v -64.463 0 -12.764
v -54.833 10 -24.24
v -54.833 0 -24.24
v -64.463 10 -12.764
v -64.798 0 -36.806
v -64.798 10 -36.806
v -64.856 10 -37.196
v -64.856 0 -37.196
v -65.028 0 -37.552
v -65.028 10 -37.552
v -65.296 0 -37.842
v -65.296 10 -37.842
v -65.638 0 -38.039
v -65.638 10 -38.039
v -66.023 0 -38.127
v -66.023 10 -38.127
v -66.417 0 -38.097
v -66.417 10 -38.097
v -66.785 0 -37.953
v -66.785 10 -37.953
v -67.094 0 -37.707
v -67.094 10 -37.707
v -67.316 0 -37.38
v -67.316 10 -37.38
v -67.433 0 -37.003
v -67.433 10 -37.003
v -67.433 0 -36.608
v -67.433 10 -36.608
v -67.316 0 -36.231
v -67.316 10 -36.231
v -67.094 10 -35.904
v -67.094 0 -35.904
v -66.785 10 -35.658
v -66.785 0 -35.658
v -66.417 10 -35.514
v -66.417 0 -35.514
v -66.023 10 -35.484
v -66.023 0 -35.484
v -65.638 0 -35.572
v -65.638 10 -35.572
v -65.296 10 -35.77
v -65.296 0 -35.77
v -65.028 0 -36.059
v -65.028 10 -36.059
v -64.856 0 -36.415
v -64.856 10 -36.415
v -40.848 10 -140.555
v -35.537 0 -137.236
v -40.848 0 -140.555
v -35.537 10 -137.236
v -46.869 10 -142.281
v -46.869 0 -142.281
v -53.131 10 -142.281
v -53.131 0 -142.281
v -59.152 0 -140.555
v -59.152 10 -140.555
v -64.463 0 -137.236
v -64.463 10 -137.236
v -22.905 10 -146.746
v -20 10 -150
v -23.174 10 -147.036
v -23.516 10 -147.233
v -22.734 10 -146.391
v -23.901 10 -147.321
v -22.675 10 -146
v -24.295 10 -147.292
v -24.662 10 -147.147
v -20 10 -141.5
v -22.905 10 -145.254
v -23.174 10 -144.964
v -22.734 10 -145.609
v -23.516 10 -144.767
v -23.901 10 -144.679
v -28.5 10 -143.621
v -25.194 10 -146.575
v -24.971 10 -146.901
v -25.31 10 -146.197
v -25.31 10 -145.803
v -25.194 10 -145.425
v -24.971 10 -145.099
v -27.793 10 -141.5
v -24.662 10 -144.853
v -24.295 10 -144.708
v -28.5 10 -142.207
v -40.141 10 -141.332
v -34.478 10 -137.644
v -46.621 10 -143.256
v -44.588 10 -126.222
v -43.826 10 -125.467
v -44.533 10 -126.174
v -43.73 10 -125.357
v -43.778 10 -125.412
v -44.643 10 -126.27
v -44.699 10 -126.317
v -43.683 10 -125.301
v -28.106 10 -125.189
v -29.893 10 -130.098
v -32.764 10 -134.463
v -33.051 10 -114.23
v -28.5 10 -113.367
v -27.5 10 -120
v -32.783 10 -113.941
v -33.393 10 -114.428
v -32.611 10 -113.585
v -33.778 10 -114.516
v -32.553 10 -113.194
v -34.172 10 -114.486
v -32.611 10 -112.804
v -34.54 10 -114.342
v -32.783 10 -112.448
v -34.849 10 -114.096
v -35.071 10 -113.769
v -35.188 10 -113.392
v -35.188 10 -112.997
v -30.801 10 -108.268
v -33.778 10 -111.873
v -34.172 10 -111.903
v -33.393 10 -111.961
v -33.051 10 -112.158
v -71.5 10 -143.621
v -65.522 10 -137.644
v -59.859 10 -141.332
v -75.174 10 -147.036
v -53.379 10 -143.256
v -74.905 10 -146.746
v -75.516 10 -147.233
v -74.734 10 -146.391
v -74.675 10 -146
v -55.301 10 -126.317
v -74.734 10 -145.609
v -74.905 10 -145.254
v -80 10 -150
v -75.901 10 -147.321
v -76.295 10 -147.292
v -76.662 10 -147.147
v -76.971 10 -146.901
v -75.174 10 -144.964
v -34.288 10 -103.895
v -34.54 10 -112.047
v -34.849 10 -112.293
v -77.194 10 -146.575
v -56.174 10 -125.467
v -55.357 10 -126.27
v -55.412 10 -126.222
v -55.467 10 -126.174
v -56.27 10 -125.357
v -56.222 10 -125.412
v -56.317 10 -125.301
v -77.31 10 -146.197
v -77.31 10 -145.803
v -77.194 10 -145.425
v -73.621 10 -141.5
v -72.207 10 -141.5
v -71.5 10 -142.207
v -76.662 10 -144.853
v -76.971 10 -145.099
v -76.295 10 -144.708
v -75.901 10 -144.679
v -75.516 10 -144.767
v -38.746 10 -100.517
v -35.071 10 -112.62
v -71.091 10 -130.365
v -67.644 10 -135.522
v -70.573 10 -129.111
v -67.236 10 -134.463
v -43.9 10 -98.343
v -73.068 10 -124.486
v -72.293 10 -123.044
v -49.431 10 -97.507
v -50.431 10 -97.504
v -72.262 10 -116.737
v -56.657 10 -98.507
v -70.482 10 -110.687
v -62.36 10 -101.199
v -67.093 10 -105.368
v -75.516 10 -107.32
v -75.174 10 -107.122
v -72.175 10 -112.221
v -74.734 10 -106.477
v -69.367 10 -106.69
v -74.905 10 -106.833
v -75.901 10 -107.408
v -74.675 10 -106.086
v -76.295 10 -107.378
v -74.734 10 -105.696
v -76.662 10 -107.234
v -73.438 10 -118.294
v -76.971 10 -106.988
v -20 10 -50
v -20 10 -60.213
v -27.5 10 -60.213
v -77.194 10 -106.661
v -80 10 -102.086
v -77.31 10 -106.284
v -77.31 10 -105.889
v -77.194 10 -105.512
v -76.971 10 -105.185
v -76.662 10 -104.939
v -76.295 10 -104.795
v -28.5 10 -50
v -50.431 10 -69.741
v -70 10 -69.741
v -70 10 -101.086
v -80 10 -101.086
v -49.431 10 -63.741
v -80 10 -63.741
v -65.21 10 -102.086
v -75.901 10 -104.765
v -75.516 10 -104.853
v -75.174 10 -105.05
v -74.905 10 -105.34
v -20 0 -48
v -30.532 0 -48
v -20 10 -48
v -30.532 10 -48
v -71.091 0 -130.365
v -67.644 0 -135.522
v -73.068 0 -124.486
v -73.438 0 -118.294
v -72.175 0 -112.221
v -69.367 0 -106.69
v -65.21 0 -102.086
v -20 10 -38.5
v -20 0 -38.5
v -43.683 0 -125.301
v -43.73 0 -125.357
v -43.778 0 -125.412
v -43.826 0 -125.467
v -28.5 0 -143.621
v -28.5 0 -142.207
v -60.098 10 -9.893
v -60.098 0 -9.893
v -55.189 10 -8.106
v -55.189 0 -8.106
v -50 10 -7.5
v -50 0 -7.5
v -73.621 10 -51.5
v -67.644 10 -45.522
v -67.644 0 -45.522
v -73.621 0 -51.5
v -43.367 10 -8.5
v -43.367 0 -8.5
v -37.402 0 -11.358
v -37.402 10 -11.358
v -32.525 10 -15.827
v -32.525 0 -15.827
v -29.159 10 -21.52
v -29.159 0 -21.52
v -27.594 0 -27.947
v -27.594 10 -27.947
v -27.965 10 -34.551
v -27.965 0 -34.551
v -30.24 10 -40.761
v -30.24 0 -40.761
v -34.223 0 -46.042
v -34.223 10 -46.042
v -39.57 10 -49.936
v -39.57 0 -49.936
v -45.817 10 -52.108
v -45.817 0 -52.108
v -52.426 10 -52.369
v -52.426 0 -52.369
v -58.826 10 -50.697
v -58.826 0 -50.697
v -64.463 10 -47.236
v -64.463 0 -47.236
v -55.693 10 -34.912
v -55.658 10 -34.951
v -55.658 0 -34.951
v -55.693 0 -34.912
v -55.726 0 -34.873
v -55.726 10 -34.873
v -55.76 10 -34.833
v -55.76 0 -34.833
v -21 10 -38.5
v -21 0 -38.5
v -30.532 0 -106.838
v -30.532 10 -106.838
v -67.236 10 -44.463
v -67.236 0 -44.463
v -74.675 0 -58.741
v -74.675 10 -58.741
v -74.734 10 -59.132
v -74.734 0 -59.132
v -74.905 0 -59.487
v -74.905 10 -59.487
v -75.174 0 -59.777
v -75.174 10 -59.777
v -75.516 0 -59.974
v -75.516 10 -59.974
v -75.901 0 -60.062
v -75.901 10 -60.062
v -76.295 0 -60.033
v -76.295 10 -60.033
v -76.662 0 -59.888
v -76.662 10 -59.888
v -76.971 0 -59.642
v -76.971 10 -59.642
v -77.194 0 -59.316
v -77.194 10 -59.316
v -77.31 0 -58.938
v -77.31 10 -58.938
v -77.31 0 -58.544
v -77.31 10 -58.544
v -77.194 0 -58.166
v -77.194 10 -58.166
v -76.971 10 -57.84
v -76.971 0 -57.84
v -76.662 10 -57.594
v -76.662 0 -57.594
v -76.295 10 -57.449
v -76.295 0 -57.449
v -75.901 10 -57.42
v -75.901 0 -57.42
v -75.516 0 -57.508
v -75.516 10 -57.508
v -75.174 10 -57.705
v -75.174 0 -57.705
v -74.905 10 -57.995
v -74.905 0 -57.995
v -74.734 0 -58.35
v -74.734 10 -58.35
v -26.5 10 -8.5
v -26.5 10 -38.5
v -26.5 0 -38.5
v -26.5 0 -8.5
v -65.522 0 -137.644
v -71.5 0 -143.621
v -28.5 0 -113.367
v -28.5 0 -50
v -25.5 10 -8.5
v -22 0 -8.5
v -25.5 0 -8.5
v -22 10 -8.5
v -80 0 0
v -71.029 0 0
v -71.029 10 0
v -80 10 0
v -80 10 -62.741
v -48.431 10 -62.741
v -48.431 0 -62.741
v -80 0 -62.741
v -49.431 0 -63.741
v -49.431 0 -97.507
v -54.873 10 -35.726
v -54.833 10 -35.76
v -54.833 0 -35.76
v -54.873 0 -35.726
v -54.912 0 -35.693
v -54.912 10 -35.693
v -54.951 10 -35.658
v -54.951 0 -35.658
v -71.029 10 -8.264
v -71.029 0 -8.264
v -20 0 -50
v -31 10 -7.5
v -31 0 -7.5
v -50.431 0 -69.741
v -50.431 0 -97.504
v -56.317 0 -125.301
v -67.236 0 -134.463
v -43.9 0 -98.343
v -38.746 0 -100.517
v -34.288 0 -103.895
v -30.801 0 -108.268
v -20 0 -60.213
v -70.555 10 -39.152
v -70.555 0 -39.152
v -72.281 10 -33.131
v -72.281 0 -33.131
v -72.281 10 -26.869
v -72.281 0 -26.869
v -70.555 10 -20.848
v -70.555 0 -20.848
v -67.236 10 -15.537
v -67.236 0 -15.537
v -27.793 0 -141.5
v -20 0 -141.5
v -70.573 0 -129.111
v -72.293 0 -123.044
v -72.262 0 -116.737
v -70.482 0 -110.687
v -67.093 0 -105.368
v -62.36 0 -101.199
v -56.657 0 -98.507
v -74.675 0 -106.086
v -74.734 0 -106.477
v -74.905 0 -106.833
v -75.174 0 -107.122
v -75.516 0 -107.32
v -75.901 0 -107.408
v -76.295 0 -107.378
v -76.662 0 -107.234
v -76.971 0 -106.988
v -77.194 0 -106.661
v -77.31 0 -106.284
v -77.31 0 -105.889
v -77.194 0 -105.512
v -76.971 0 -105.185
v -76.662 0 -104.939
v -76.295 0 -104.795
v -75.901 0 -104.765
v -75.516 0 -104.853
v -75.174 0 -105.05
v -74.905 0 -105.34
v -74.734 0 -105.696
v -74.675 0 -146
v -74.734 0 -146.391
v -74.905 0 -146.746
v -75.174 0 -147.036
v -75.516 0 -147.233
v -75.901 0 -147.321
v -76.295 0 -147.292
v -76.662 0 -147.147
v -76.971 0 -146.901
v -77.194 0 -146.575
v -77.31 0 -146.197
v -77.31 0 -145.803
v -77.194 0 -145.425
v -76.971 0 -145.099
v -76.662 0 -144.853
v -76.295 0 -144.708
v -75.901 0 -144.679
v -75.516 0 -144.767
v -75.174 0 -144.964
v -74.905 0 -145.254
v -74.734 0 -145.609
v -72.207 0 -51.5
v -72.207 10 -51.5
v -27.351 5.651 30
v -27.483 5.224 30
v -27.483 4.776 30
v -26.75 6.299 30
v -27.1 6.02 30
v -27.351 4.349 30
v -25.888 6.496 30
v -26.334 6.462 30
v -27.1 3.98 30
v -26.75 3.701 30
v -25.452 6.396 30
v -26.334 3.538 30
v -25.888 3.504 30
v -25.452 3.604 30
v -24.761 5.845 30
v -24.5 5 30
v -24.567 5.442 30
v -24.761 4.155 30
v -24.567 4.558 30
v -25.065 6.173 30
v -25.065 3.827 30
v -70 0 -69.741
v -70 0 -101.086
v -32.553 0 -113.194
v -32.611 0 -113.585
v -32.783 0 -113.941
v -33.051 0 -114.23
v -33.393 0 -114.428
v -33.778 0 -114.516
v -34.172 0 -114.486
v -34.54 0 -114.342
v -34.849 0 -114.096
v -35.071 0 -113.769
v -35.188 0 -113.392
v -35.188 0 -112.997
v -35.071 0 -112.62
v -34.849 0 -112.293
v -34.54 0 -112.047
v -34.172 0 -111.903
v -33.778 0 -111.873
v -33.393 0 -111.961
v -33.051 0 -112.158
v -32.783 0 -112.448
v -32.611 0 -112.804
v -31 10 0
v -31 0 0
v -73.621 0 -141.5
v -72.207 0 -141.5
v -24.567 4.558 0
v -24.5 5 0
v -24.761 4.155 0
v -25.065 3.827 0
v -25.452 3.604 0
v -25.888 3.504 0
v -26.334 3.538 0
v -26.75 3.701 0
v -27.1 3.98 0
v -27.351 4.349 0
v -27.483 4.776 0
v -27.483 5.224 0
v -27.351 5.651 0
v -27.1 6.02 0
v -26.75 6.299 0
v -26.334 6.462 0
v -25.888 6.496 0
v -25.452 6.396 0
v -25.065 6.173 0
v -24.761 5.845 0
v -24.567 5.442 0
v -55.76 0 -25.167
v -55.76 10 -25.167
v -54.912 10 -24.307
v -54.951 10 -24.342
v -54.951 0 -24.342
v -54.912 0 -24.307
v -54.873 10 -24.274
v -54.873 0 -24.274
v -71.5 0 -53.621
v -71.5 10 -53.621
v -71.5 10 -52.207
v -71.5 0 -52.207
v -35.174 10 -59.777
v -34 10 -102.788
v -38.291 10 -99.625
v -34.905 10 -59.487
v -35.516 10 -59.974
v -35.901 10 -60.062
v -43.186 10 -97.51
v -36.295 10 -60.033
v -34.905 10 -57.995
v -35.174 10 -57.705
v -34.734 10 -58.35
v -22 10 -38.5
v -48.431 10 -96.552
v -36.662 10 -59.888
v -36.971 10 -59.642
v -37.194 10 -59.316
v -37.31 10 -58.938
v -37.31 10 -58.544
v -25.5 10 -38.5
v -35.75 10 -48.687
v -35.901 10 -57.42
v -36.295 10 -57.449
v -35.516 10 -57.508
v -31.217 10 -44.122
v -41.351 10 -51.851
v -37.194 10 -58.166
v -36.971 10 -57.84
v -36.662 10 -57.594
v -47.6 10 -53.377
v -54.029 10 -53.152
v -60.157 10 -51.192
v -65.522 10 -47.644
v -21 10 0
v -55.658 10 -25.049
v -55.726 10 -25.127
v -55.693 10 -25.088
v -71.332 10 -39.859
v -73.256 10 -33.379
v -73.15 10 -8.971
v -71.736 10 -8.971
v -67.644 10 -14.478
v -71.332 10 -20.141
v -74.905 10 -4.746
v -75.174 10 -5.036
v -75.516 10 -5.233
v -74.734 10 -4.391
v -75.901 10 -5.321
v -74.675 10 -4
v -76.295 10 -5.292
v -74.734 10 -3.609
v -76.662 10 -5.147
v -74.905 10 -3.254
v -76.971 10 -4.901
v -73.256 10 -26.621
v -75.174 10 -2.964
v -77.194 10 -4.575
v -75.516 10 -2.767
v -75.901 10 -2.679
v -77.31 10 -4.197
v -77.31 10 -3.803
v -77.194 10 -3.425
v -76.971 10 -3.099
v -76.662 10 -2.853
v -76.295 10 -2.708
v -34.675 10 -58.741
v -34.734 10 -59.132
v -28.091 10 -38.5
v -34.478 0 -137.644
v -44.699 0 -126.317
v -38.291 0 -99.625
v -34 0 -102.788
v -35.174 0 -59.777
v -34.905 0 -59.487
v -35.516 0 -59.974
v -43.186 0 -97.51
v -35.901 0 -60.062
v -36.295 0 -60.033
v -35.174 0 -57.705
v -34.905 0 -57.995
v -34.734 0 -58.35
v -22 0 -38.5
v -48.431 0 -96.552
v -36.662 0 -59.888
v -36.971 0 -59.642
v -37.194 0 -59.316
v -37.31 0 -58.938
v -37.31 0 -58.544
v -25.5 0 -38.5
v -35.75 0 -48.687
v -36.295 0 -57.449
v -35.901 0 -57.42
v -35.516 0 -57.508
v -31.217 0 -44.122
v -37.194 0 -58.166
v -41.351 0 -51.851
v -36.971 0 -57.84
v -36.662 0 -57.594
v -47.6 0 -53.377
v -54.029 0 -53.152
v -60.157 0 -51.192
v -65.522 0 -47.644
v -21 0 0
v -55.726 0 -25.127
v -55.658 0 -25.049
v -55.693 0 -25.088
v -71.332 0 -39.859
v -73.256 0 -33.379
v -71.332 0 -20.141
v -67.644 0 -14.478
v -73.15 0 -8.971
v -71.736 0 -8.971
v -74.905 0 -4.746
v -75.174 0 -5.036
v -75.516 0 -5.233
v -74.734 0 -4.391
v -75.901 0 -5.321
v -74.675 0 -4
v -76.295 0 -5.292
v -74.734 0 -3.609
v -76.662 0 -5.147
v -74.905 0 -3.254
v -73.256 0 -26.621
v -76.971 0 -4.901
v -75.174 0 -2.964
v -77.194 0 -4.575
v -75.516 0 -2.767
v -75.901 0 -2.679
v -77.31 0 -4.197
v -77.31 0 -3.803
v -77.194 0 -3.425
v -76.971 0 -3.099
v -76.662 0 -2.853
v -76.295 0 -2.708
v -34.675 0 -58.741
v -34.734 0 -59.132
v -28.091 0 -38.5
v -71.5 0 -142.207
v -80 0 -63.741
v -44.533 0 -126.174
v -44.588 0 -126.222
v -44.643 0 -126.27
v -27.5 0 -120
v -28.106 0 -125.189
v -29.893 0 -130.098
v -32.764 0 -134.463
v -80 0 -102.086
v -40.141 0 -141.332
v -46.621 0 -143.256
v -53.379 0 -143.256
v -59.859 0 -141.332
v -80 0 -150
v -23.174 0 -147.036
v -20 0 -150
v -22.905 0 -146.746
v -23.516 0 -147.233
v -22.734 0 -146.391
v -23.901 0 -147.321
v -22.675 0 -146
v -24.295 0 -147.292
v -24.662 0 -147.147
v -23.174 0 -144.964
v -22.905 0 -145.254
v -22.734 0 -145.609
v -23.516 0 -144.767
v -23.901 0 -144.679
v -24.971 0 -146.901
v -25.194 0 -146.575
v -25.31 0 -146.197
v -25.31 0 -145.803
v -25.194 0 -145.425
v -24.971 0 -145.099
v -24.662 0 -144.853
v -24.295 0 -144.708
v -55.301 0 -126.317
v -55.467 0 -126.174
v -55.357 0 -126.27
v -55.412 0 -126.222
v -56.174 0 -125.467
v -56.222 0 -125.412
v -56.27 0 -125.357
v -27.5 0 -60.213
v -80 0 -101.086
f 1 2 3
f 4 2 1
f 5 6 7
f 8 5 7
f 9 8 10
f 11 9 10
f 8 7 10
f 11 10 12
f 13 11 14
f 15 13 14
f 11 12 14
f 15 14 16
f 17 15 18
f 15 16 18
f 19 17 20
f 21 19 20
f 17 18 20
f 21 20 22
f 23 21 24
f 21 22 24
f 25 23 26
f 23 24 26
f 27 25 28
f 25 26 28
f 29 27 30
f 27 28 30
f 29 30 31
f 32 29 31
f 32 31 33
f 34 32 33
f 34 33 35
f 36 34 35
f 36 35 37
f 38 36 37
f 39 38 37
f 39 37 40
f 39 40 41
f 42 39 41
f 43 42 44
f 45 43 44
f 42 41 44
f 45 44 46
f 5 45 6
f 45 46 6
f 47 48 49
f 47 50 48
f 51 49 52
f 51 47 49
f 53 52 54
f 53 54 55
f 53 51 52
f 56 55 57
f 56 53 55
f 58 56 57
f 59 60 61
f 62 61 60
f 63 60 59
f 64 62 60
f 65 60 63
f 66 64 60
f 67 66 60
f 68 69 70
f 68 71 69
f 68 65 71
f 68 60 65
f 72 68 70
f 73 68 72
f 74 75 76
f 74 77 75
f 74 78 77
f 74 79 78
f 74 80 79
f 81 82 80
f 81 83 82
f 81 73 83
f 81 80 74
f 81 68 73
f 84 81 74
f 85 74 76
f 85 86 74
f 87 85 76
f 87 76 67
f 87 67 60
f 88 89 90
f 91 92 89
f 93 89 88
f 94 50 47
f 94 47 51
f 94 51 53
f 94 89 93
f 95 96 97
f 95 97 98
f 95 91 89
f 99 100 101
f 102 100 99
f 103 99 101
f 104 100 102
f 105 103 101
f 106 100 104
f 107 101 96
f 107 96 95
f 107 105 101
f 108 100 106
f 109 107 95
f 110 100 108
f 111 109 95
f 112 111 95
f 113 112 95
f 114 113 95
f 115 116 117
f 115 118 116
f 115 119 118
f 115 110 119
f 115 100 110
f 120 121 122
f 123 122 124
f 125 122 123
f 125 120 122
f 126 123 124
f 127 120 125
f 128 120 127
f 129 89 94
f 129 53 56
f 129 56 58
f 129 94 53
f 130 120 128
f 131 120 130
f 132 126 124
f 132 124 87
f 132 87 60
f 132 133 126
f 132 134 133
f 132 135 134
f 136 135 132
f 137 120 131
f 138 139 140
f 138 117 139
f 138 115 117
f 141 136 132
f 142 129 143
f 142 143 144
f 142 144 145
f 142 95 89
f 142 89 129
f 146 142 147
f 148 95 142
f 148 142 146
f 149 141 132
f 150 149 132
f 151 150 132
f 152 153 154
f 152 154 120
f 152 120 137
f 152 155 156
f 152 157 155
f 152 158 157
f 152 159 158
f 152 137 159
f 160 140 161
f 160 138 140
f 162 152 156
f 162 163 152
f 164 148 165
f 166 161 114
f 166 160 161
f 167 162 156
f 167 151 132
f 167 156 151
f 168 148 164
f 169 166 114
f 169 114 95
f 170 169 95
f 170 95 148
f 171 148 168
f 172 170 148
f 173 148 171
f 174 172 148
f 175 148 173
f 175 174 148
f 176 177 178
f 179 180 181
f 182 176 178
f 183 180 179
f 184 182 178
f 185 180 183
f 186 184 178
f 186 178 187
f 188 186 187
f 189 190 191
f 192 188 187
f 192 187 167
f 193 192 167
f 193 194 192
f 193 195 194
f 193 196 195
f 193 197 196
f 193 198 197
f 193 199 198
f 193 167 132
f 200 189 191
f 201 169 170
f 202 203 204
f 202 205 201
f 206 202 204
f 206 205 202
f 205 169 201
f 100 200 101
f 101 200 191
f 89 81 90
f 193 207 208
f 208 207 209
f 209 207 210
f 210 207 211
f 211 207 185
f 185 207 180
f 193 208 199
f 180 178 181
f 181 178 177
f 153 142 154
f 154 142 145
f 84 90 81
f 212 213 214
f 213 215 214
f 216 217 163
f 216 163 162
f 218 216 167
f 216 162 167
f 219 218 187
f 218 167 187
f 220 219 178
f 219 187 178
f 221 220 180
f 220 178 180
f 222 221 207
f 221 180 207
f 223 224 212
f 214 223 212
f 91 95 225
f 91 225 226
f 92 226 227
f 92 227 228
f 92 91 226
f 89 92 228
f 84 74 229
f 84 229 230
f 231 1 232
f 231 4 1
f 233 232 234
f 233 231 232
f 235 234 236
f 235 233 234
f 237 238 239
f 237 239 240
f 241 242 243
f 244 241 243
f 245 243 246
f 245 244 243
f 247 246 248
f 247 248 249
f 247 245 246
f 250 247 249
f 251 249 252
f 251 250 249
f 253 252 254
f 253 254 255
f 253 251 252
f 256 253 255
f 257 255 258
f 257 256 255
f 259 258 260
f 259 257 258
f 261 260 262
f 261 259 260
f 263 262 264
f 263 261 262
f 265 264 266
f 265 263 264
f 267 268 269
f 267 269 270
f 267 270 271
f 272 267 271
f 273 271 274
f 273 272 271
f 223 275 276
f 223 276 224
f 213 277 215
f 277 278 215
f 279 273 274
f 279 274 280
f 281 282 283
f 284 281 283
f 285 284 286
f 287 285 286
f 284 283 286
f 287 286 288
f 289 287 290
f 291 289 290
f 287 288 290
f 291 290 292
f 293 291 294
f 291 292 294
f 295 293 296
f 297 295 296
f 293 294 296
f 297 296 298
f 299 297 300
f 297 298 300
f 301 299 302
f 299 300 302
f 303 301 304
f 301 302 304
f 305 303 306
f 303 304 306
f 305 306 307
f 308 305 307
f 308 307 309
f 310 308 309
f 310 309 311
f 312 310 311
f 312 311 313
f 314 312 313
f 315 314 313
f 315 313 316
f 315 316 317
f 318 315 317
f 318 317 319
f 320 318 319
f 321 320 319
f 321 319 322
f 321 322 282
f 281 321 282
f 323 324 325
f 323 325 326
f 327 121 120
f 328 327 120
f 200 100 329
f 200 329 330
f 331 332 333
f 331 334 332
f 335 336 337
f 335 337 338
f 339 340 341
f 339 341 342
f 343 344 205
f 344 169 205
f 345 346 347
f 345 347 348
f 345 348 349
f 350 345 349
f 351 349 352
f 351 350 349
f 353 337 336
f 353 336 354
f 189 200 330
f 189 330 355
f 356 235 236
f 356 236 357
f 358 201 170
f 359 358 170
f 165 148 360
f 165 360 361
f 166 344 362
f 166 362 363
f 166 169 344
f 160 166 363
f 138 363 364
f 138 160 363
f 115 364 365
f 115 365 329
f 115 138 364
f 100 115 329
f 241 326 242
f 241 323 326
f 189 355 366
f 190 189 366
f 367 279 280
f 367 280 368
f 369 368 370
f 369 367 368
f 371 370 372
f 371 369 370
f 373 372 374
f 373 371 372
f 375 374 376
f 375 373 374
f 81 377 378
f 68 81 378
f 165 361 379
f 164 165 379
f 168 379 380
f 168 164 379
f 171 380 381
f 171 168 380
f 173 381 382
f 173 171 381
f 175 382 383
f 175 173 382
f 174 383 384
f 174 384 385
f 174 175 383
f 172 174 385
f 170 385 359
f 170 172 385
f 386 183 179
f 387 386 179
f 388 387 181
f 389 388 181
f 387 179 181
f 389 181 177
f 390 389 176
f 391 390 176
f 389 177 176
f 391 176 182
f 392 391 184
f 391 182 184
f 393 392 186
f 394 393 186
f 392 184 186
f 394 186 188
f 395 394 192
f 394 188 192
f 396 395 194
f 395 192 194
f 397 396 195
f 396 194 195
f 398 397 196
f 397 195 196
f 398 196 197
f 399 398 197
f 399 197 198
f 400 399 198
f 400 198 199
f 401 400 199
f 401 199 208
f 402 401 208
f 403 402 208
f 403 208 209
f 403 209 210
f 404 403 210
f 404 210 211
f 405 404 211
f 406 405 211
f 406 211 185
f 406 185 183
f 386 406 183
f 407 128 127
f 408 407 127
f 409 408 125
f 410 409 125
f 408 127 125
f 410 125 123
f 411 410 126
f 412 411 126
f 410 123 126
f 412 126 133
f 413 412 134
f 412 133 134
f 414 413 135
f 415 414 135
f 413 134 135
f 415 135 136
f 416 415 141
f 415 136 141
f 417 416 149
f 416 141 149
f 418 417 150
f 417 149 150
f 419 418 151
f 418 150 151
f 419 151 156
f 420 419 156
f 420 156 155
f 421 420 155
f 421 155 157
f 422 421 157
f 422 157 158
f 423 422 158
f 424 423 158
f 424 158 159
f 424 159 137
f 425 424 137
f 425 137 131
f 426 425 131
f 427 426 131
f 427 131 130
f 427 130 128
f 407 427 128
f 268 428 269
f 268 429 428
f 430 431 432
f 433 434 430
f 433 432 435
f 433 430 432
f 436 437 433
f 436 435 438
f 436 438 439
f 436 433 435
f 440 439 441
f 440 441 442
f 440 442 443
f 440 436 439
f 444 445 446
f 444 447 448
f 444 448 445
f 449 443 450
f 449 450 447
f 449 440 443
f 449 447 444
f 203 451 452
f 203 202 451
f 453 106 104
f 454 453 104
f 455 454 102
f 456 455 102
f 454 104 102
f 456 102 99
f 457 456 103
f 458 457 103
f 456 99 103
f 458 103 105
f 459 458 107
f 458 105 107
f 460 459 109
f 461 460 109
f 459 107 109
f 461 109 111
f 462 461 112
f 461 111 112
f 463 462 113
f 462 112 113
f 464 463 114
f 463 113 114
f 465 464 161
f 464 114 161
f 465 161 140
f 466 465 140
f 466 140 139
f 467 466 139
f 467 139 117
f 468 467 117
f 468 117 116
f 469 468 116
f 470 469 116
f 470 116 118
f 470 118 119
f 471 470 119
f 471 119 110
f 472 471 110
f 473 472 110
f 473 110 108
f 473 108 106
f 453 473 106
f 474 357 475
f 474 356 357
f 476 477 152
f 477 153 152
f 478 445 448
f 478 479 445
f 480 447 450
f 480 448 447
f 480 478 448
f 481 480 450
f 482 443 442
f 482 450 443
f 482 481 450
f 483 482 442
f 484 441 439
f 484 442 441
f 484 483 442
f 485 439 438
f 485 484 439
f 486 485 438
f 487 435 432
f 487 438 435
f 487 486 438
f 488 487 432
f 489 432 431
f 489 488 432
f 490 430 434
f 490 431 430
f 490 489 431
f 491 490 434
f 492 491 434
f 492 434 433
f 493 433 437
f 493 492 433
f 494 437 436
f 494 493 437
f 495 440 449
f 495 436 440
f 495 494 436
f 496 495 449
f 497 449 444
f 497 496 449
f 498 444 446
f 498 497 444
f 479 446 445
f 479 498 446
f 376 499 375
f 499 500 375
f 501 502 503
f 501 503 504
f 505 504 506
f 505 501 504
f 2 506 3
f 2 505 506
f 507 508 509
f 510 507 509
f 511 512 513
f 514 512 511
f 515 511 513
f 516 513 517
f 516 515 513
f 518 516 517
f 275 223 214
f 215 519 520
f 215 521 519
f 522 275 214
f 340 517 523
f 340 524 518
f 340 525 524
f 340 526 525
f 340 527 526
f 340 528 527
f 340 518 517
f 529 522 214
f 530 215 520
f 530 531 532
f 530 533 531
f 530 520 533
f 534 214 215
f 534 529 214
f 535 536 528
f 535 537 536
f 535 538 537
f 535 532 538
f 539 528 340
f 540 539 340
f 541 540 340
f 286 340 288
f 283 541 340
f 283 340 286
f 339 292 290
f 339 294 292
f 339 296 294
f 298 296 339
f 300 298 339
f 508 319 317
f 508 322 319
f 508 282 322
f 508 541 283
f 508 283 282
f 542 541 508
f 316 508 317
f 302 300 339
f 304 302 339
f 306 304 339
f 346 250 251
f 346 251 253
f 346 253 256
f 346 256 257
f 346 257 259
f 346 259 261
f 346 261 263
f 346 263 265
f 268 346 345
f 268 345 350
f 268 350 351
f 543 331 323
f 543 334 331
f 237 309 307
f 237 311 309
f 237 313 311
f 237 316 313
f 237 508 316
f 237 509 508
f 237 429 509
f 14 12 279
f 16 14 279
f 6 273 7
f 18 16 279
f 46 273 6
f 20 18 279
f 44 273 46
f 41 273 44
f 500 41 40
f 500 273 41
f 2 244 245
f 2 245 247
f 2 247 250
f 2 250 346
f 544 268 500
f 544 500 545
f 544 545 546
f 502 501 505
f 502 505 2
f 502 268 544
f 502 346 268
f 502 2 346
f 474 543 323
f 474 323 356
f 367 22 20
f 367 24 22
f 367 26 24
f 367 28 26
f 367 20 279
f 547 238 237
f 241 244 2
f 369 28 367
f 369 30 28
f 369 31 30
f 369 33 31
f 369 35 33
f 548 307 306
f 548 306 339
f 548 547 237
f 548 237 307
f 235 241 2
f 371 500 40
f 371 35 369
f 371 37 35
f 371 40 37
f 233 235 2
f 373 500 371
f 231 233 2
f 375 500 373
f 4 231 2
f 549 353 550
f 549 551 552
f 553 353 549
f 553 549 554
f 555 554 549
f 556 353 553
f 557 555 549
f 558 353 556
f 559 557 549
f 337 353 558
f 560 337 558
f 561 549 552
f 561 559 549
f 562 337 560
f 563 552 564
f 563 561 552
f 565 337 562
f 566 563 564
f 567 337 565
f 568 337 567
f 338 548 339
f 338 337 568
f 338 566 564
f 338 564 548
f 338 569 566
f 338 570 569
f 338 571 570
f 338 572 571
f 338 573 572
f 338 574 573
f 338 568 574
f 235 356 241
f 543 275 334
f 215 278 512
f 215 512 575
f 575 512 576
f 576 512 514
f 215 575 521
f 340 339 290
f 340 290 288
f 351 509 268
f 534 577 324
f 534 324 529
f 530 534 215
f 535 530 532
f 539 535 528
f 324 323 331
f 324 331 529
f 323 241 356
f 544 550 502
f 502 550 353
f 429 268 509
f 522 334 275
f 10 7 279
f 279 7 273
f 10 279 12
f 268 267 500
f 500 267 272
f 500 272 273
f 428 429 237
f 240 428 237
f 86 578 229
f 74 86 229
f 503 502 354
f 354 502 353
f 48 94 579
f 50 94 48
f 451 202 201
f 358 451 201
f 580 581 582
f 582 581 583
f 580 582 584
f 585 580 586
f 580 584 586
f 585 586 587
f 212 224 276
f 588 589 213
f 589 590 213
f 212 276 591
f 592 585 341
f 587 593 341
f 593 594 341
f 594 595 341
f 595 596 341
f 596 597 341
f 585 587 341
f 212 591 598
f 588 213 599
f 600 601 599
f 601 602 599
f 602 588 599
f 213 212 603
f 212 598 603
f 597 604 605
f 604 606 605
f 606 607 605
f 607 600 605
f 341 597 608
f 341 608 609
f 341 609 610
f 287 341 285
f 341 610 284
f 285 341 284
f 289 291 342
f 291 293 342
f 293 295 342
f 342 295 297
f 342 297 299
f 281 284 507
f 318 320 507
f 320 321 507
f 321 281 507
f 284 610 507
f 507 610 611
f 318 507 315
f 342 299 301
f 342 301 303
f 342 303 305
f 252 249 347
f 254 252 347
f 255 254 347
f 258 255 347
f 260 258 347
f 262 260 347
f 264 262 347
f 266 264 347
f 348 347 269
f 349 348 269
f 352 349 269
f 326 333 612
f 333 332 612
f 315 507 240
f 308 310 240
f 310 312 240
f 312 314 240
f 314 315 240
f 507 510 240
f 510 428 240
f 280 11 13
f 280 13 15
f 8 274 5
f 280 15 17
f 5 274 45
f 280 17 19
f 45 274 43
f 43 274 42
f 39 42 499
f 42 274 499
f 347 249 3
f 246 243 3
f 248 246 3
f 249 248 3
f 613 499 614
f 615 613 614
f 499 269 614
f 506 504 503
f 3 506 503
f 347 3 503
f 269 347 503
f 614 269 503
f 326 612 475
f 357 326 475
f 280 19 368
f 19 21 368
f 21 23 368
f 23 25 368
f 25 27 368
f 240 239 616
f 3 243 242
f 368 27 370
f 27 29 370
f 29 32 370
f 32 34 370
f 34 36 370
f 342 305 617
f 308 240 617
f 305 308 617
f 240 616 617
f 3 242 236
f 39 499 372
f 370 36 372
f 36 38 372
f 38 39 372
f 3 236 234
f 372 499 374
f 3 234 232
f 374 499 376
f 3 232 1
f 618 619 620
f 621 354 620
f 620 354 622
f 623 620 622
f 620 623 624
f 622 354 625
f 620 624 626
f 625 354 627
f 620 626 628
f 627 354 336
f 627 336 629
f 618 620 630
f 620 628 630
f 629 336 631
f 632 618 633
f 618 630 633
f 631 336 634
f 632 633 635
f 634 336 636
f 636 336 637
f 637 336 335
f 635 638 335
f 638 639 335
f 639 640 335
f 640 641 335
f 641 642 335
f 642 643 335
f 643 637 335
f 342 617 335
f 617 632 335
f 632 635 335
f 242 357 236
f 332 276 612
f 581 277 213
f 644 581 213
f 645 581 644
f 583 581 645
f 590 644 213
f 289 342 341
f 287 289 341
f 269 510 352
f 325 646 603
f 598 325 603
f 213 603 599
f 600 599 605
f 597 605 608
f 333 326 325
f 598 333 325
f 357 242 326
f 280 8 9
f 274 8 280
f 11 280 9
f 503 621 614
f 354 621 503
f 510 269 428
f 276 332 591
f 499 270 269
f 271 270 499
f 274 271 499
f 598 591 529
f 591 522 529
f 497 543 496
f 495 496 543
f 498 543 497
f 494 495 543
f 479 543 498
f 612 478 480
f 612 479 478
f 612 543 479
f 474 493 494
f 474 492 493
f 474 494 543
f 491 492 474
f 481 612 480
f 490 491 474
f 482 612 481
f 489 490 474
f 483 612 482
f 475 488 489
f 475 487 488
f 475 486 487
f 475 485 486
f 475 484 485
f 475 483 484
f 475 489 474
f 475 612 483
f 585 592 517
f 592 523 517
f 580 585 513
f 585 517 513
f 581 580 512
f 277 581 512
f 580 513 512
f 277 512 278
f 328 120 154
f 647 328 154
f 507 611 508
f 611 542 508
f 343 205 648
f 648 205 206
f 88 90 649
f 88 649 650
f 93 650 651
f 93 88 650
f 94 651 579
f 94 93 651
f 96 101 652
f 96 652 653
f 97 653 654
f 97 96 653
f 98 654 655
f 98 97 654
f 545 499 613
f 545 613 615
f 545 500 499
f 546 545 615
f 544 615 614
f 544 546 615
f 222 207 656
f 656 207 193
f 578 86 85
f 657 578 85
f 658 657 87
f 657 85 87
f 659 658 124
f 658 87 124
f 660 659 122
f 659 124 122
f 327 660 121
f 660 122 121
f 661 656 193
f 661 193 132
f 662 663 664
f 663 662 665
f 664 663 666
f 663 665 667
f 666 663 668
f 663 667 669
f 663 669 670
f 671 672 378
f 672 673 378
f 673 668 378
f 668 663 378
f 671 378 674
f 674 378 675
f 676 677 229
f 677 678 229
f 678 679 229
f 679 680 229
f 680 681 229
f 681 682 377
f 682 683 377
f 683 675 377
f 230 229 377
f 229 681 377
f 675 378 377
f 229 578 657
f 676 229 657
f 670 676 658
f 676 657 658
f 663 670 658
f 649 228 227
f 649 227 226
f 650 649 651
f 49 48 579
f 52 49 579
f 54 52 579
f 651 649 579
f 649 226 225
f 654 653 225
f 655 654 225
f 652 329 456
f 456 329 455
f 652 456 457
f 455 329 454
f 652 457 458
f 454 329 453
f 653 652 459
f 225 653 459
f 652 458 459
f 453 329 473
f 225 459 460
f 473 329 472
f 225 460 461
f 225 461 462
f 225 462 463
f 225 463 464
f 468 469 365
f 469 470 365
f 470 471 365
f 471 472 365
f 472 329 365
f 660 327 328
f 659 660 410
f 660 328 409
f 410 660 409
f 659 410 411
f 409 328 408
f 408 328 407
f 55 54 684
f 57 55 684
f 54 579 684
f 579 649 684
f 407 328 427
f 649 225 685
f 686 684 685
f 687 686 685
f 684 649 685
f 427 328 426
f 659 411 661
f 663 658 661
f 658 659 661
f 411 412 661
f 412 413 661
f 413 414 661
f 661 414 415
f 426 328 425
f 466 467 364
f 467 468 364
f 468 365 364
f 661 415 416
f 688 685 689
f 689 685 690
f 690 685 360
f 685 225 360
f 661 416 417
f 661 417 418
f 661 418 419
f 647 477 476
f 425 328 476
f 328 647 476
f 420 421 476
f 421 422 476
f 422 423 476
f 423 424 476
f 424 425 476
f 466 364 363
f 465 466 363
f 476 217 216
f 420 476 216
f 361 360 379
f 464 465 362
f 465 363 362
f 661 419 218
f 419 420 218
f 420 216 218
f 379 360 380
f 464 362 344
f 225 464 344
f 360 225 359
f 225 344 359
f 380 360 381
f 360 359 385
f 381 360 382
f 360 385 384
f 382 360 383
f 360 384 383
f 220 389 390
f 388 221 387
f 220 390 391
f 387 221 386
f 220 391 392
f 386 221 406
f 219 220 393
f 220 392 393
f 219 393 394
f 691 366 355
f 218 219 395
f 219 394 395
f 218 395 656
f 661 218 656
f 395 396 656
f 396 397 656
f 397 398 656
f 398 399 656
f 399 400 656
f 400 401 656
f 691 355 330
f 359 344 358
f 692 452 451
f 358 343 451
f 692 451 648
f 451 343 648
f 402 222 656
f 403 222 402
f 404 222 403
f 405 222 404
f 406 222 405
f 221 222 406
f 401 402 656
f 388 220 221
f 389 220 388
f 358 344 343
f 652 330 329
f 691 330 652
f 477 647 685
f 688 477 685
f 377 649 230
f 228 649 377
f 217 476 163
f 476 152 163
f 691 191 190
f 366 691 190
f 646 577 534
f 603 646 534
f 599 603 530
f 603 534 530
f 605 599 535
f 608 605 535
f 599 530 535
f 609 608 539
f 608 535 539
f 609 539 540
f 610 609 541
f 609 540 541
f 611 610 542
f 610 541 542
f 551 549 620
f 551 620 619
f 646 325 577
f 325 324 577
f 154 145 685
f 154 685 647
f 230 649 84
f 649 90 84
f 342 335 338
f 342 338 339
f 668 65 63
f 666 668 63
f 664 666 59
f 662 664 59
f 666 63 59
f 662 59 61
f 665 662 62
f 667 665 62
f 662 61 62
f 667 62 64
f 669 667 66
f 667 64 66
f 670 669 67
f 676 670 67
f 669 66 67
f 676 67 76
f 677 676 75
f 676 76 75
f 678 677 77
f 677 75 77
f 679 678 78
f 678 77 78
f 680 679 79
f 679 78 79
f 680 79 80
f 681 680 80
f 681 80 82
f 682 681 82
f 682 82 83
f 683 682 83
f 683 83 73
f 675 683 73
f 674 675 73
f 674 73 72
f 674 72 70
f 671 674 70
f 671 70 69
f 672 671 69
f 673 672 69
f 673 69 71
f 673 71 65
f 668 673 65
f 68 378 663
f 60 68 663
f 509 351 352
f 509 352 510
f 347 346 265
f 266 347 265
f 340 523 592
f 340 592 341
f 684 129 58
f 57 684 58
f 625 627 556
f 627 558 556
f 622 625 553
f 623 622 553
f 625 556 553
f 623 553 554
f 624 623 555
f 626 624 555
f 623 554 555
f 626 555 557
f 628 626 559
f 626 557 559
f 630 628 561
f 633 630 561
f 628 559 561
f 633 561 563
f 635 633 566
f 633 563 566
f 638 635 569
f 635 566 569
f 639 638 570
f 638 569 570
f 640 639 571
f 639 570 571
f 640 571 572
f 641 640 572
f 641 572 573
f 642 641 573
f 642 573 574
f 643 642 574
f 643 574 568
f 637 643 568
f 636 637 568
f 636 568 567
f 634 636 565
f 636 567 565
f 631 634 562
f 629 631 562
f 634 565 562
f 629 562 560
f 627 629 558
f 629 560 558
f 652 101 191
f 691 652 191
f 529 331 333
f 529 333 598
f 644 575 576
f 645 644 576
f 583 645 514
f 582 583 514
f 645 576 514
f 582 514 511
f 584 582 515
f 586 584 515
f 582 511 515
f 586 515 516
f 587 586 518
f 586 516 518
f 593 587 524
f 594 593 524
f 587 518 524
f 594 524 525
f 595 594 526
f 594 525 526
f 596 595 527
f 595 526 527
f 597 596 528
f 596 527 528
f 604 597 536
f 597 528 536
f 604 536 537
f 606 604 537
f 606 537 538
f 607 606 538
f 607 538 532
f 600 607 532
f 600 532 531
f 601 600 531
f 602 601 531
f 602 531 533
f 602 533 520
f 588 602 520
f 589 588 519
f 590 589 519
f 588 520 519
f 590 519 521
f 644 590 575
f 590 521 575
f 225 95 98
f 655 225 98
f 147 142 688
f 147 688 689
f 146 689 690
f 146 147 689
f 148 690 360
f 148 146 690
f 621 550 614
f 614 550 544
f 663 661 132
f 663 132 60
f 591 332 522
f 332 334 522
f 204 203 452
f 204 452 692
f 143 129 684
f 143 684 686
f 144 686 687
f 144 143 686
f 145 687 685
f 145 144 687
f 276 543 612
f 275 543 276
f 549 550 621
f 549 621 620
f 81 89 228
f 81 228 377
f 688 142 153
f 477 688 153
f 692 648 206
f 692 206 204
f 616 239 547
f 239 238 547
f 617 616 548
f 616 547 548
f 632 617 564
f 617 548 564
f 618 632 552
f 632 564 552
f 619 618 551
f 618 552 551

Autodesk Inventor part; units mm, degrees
ref_plane "YZ Plane" through (0, 0, 0) normal (1, 0, 0) x (0, 1, 0)
ref_plane "XZ Plane" through (0, 0, 0) normal (0, 1, 0) x (-1, 0, 0)
ref_plane "XY Plane" through (0, 0, 0) normal (0, 0, 1) x (1, 0, 0)
sketch "Sketch1" plane through (0, 0, 0) normal (0, 1, 0) x (-1, 0, 0)
  line L0 (0, 0) -> (100, 0)
  line L1 (100, 0) -> (100, -150)
  line L2 (100, -150) -> (0, -150)
  line L3 (0, -150) -> (0, 0)
  line L4 (0, 0) -> (20, 0)
  line L5 (20, 0) -> (20, -150)
  line L6 (20, -150) -> (0, -150)
  line L7 (0, -150) -> (0, 0)
  line L8 (100, 0) -> (80, 0)
  line L9 (80, 0) -> (80, -150)
  line L10 (80, -150) -> (100, -150)
  line L11 (100, -150) -> (100, 0)
  dimension "d0" = 100
  dimension "d1" = 150
  dimension "d2" = 20
  dimension "d3" = 20
  dimension "d4" = 150
  dimension "d5" = 150
extrude "Extrusion1" add sketch "Sketch1" along normal blind 10 contours L0 L9 L2 L5
sketch "Sketch2" plane through (0, 10, 0) normal (0, 1, 0) x (1, 0, 0)
  line L0 (-80, 150) -> (-80, 0) projected
  line L1 (-80, 0) -> (-20, 0) projected
  line L2 (-20, 150) -> (-50, 120)
  line L3 (-20, 150) -> (-80, 150) projected
  line L4 (-50, 120) -> (-80, 150)
  circle A0 centre (-50, 30) radius 7.519
  circle A1 centre (-50, 120) radius 8.2469
  line L5 (-50, 120) -> (-32.764, 134.4627)
  line L6 (-50, 120) -> (-35.5373, 137.236)
  line L7 (-50, 120) -> (-64.4627, 137.236)
  line L8 (-50, 120) -> (-67.236, 134.4627)
  line L9 (-50, 30) -> (-80, 60)
  line L10 (-50, 30) -> (-64.4627, 47.236)
  line L11 (-50, 30) -> (-67.236, 44.4627)
  line L12 (-27.5, 120) -> (-27.5, 60.2126)
  line L13 (-27.5, 60.2126) -> (-20, 60.2126)
  line L14 (-80, 0) -> (-50, 30)
  line L15 (-50, 30) -> (-67.236, 15.5373)
  line L16 (-50, 30) -> (-64.4627, 12.764)
  line L17 (-49.9308, 97.5001) -> (-49.9308, 66.741)
  line L18 (-80, 66.741) -> (-80.1256, 66.741)
  line L19 (-50, 7.5) -> (-21, 7.5)
  line L20 (-21, 7.5) -> (-21, 8.5)
  line L21 (-20, 0) -> (-20, 150) projected
  line L22 (-21, 7.5) -> (-31, 7.5)
  line L23 (-31, 7.5) -> (-31, 0)
  line L24 (-31, 0) -> (-21, 0)
  line L25 (-21, 0) -> (-21, 7.5)
  line L26 (-21, 8.5) -> (-22, 8.5)
  line L27 (-22, 8.5) -> (-22, 38.5)
  line L28 (-22, 38.5) -> (-21, 38.5)
  line L29 (-21, 38.5) -> (-21, 8.5)
  line L30 (-26.5, 8.5) -> (-25.5, 8.5)
  line L31 (-25.5, 8.5) -> (-25.5, 38.5)
  line L32 (-25.5, 38.5) -> (-26.5, 38.5)
  line L33 (-26.5, 38.5) -> (-26.5, 8.5)
  line L34 (-28.5, 113.3668) -> (-28.5, 50)
  line L35 (-28.5, 50) -> (-27.5, 50)
  line L36 (-27.5, 60.2126) -> (-27.5, 120)
  line L37 (-20, 62.2126) -> (-26.5, 62.2126)
  line L38 (-27.5, 62.2126) -> (-27.5, 60.2126)
  line L39 (-27.5, 50) -> (-20, 50)
  line L40 (-20, 50) -> (-20, 62.2126)
  line L41 (-20, 50) -> (-28.5, 50)
  line L42 (-30.5318, 50) -> (-30.5318, 48)
  line L43 (-30.5318, 48) -> (-20, 48)
  line L44 (-20, 48) -> (-20, 50)
  line L45 (-28.5, 50) -> (-28.5, 106.8379)
  line L46 (-30.5318, 106.8379) -> (-30.5318, 50)
  line L47 (-26.5, 62.2126) -> (-26.5, 120)
  line L48 (-26.5, 120) -> (-27.5, 120)
  line L49 (-27.5, 120) -> (-27.5, 62.2126)
  line L50 (-49.4308, 97.5072) -> (-49.4308, 63.741)
  line L51 (-49.4308, 63.741) -> (-50.4308, 63.741)
  line L52 (-50.4308, 63.741) -> (-80, 63.741)
  line L53 (-80, 63.741) -> (-80, 69.741)
  line L54 (-80, 69.741) -> (-50.4308, 69.741)
  line L55 (-80, 69.741) -> (-70, 69.741)
  line L56 (-70, 69.741) -> (-70, 101.0864)
  line L57 (-70, 101.0864) -> (-80, 101.0864)
  line L58 (-80, 101.0864) -> (-80, 69.741)
  line L59 (-80, 63.741) -> (-49.4308, 63.741)
  line L60 (-48.4308, 63.741) -> (-48.4308, 62.741)
  line L61 (-48.4308, 62.741) -> (-80, 62.741)
  line L62 (-80, 62.741) -> (-80, 63.741)
  line L63 (-49.4308, 63.741) -> (-49.4308, 96.9392)
  line L64 (-48.4308, 96.5525) -> (-48.4308, 63.741)
  line L65 (-80, 101.0864) -> (-63.9473, 101.0864)
  line L66 (-65.2103, 102.0864) -> (-80, 102.0864)
  line L67 (-80, 102.0864) -> (-80, 101.0864)
  line L68 (-54.9514, 24.3415) -> (-71.9108, 7.382)
  line L69 (-71.9108, 7.382) -> (-72.618, 8.0892)
  line L70 (-72.618, 8.0892) -> (-55.6585, 25.0486)
  line L71 (-80, 0) -> (-71.0291, 0)
  line L72 (-71.0291, 0) -> (-71.0291, 8.9709)
  line L73 (-71.0291, 8.9709) -> (-80, 8.9709)
  line L74 (-80, 8.9709) -> (-80, 0)
  line L75 (-65.5225, 12.3562) -> (-71.0291, 6.8496)
  line L76 (-73.1504, 8.9709) -> (-67.6438, 14.4775)
  line L77 (-80, 60) -> (-71.5, 60)
  line L78 (-71.5, 60) -> (-71.5, 51.5)
  line L79 (-71.5, 51.5) -> (-80, 51.5)
  line L80 (-80, 51.5) -> (-80, 60)
  line L81 (-67.6438, 45.5225) -> (-73.6213, 51.5)
  line L82 (-65.5225, 47.6438) -> (-71.5, 53.6213)
  line L83 (-54.9514, 35.6585) -> (-71.5, 52.2071)
  line L84 (-72.2071, 51.5) -> (-55.6585, 34.9514)
  line L85 (-56.1742, 125.4671) -> (-72.2071, 141.5)
  line L86 (-80, 150) -> (-71.5, 150)
  line L87 (-71.5, 150) -> (-71.5, 141.5)
  line L88 (-71.5, 141.5) -> (-80, 141.5)
  line L89 (-80, 141.5) -> (-80, 150)
  line L90 (-20, 150) -> (-28.5, 150)
  line L91 (-28.5, 150) -> (-28.5, 141.5)
  line L92 (-28.5, 141.5) -> (-20, 141.5)
  line L93 (-20, 141.5) -> (-20, 150)
  line L94 (-55.4671, 126.1742) -> (-71.5, 142.2071)
  line L95 (-73.6213, 141.5) -> (-67.6438, 135.5225)
  line L96 (-65.5225, 137.6438) -> (-71.5, 143.6213)
  line L97 (-43.8258, 125.4671) -> (-27.7929, 141.5)
  line L98 (-44.5329, 126.1742) -> (-28.5, 142.2071)
  line L99 (-32.3562, 135.5225) -> (-26.3787, 141.5)
  line L100 (-34.4775, 137.6438) -> (-28.5, 143.6213)
  line L101 (-21, 8.5) -> (-25.5, 8.5)
  line L102 (-26.5, 8.5) -> (-43.3668, 8.5)
  line L103 (-22, 38.5) -> (-25.5, 38.5)
  line L104 (-26.5, 38.5) -> (-28.0911, 38.5)
  line L105 (-21, 38.5) -> (-20, 38.5)
  line L106 (-20, 38.5) -> (-20, 0)
  line L107 (-20, 0) -> (-21, 0)
  line L108 (-21, 0) -> (-21, 38.5)
  line L109 (-80, 0) -> (-20, 0)
  line L110 (-20, 0) -> (-20, 150)
  line L111 (-20, 150) -> (-80, 150)
  line L112 (-80, 150) -> (-80, 0)
  arc A2 (-65.5225, 12.3562) -> (-43.2177, 7.5) centre (-50, 30) ccw
  arc A3 (-66.9668, 13.7403) -> (-66.2597, 13.0332) centre (-50, 30) ccw
  arc A4 (-64.4627, 12.764) -> (-50, 7.5) centre (-50, 30) ccw
  arc A5 (-66.2595, 14.4476) -> (-65.5524, 13.7405) centre (-50, 30) ccw
  arc A6 (-67.236, 44.4627) -> (-67.236, 15.5373) centre (-50, 30) ccw
  arc A7 (-43.3668, 8.5) -> (-64.4627, 47.236) centre (-50, 30) ccw
  arc A8 (-65.5524, 46.2595) -> (-66.2595, 45.5524) centre (-50, 30) ccw
  arc A9 (-40.5132, 8.5) -> (-65.5225, 47.6438) centre (-50, 30) ccw
  arc A10 (-66.2597, 46.9668) -> (-66.9668, 46.2597) centre (-50, 30) ccw
  arc A11 (-67.6438, 45.5225) -> (-67.6438, 14.4775) centre (-50, 30) ccw
  arc A12 (-27.5, 120) -> (-32.764, 134.4627) centre (-50, 120) ccw
  arc A13 (-33.7405, 135.5524) -> (-34.4476, 136.2595) centre (-50, 120) ccw
  arc A14 (-26.5, 120) -> (-32.3562, 135.5225) centre (-50, 120) ccw
  arc A15 (-33.0332, 136.2597) -> (-33.7403, 136.9668) centre (-50, 120) ccw
  arc A16 (-35.5373, 137.236) -> (-64.4627, 137.236) centre (-50, 120) ccw
  arc A17 (-65.5524, 136.2595) -> (-66.2595, 135.5524) centre (-50, 120) ccw
  arc A18 (-34.4775, 137.6438) -> (-65.5225, 137.6438) centre (-50, 120) ccw
  arc A19 (-66.2597, 136.9668) -> (-66.9668, 136.2597) centre (-50, 120) ccw
  arc A20 (-67.6438, 135.5225) -> (-65.2103, 102.0864) centre (-50, 120) ccw
  line L113 (-50.4308, 69.741) -> (-50.4308, 97.5041)
  arc A21 (-48.4308, 96.5525) -> (-30.5318, 106.8379) centre (-50, 120) ccw
  arc A22 (-63.9473, 101.0864) -> (-50.4308, 96.5039) centre (-50, 120) ccw
  arc A23 (-67.236, 134.4627) -> (-50.4308, 97.5041) centre (-50, 120) ccw
  arc A24 (-49.4308, 97.5072) -> (-28.5, 113.3668) centre (-50, 120) ccw
  point P0 (-56.3175, 125.301)
  point P1 (-44.699, 126.3175)
  point P2 (-55.301, 126.3175)
  point P3 (-43.6825, 125.301)
  point P4 (-54.8331, 24.2401)
  point P5 (-71.0291, 8.2638)
  point P6 (-55.7599, 34.8331)
  point P7 (-71.7362, 8.9709)
  point P8 (-55.7599, 25.1669)
  point P9 (-54.8331, 35.7599)
  dimension "d23" = 1
  dimension "d25" = 10
  dimension "d26" = 30
  dimension "d27" = 1
  dimension "d28" = 1
  dimension "d29" = 1
  dimension "d31" = 50
  dimension "d32" = 7.5
  dimension "d34" = 2
  dimension "d35" = 2
  dimension "d37" = 0.5
  dimension "d39" = 3
  dimension "d40" = 3
  dimension "d41" = 45
  dimension "d43" = 30
  dimension "d44" = 45
  dimension "d45" = 10
  dimension "d46" = 1
  dimension "d47" = 1
  dimension "d48" = 1
  dimension "d49" = 0.5
  dimension "d50" = 0.5
  dimension "d51" = 1
  dimension "d52" = 1
  dimension "d53" = 8.5
  dimension "d58" = 0.5
  dimension "d59" = 0.5
  dimension "d60" = 1
  dimension "d61" = 1
  dimension "d62" = 0.5
  dimension "d63" = 0.5
  dimension "d64" = 1
  dimension "d65" = 1
  dimension "d66" = 8.5
  dimension "d67" = 8.5
  dimension "d68" = 30
  dimension "d69" = 30
  dimension "d70" = 30
  dimension "d71" = 8.5
  dimension "d72" = 8.5
  dimension "d73" = 0.5
  dimension "d74" = 0.5
  dimension "d75" = 1
  dimension "d76" = 1
  dimension "d77" = 5
  dimension "d78" = 5
  dimension "d79" = 5
  dimension "d80" = 5
  dimension "d81" = 5
  dimension "d82" = 5
  dimension "d83" = 5
  dimension "d84" = 5
extrude "Extrusion2" cut sketch "Sketch2" against normal blind 20 contours L66 A20 L95 L88 L85 A1 L8 A23 L113 A22 L65 L57 L0 | L96 A18 L100 L91 L98 A1 L6 A16 L7 L94 L87 | L65 A22 L113 L54 L56 | L21 L37 L47 A14 L99 L92 | L92 L99 A14 L48 A12 L5 A1 L97 | L21 L13 L12 L48 L47 L37 | L52 L51 L50 A24 L34 L35 L39 L21 L43 L42 L46 A21 L64 L60 L61 L0 | L21 L1 L25 L20 L29 L105 | L79 L84 A0 L11 A6 L15 L70 L73 L76 A11 L81 | L78 L82 A9 L102 A7 L10 A0 L83 | L27 L101 L31 L103 | L72 L75 A2 L19 L23 L1 | L104 L33 A9 | L72 L68 A0 L16 A4 L19 A2 L75 | L33 L102 A9
sketch "Sketch6" plane through (0, 10, 0) normal (0, 1, 0) x (1, 0, 0)
  arc A0 (-43.3668, 8.5) -> (-64.4627, 47.236) centre (-50, 30) ccw projected
  arc A1 (-49.4308, 97.5072) -> (-28.5, 113.3668) centre (-50, 120) ccw projected
  arc A2 (-43.3668, 8.5) -> (-64.4627, 47.236) centre (-50, 30) ccw projected
  arc A3 (-49.4308, 97.5072) -> (-28.5, 113.3668) centre (-50, 120) ccw projected
  line L0 (-28.5, 113.3668) -> (-28.5, 50) projected
  line L1 (-48.4308, 62.741) -> (-80, 62.741) projected
  line L2 (-30.5318, 106.8379) -> (-30.5318, 48) projected
  arc A4 (-67.236, 44.4627) -> (-67.236, 15.5373) centre (-50, 30) ccw projected
  line L3 (-72.5, 30) -> (-27.5, 120)
  circle A5 centre (-76, 4) radius 1.325
  circle A6 centre (-76, 58.741) radius 1.325
  circle A7 centre (-36, 58.741) radius 1.325
  circle A8 centre (-24, 146) radius 1.325
  circle A9 centre (-76, 146) radius 1.325
  circle A10 centre (-76, 106.0864) radius 1.325
  line L4 (-80, 0) -> (-71.0291, 0) projected
  line L5 (-80, 62.741) -> (-80, 0) projected
  line L6 (-20, 141.5) -> (-20, 150) projected
  line L7 (-20, 150) -> (-80, 150) projected
  line L8 (-80, 150) -> (-80, 102.0864) projected
  line L9 (-80, 102.0864) -> (-65.2103, 102.0864) projected
  point P0 (0, 0)
  dimension "d94" = 4
  dimension "d95" = 4
  dimension "d96" = 2.65
  dimension "d97" = 4
  dimension "d98" = 4
  dimension "d99" = 2.65
  dimension "d100" = 0
  dimension "d101" = 2.65
  dimension "d102" = 40
  dimension "d103" = 2.65
  dimension "d104" = 2.65
  dimension "d105" = 2.65
  dimension "d106" = 4
  dimension "d107" = 4
  dimension "d108" = 4
  dimension "d109" = 4
  dimension "d110" = 4
  dimension "d111" = 4
extrude "Extrusion3" cut sketch "Sketch6" against normal blind 10
sketch "Sketch7" plane through (0, 10, 0) normal (0, 1, 0) x (1, 0, 0)
  circle A0 centre (-66.1225, 36.8056) radius 1.1 projected
  circle A1 centre (-33.8775, 113.1944) radius 1.1 projected
  circle A2 centre (-66.1225, 36.8056) radius 1.325
  circle A3 centre (-33.8775, 113.1944) radius 1.325
  point P0 (0, 0)
  dimension "d114" = 2.65
  dimension "d115" = 2.65
extrude "Extrusion4" cut sketch "Sketch7" against normal blind 10 contours A0 | A1 | A2 | A3
sketch "Sketch8" plane through (-31, 0, 0) normal (0, 0, 1) x (1, 0, 0)
  circle A0 centre (5, 5) radius 1.5
  line L0 (0, 10) -> (10, 10) projected
  line L1 (10, 0) -> (10, 10) projected
  point P0 (31, 0)
  dimension "d118" = 3
  dimension "d119" = 5
  dimension "d120" = 5
extrude "Extrusion5" add sketch "Sketch8" along normal blind 30
equation "\"d27\" = d24"
equation "\"d28\" = BladeThickness"
equation "\"d29\" = d27"
equation "\"d37\" = d36"
equation "\"d49\" = 0.5 * d24"
equation "\"d50\" = d49"
equation "\"d58\" = 0.5 * d24"
equation "\"d59\" = d58"
equation "\"d61\" = d60"
equation "\"d62\" = 0.5 * d24"
equation "\"d63\" = d62"
equation "\"d73\" = d63"
equation "\"d74\" = d73"
equation "\"d19\" = d18"
equation "\"d21\" = d22"
equation "\"d24\" = BladeThickness"
equation "\"BladeThickness\" = 1"
equation "\"NeckThickness\" = 1"
equation "\"d36\" = 0.5 * d27"
equation "\"d18\" = 45"
equation "\"d22\" = 47"
properties part number "FlexK7V2"
